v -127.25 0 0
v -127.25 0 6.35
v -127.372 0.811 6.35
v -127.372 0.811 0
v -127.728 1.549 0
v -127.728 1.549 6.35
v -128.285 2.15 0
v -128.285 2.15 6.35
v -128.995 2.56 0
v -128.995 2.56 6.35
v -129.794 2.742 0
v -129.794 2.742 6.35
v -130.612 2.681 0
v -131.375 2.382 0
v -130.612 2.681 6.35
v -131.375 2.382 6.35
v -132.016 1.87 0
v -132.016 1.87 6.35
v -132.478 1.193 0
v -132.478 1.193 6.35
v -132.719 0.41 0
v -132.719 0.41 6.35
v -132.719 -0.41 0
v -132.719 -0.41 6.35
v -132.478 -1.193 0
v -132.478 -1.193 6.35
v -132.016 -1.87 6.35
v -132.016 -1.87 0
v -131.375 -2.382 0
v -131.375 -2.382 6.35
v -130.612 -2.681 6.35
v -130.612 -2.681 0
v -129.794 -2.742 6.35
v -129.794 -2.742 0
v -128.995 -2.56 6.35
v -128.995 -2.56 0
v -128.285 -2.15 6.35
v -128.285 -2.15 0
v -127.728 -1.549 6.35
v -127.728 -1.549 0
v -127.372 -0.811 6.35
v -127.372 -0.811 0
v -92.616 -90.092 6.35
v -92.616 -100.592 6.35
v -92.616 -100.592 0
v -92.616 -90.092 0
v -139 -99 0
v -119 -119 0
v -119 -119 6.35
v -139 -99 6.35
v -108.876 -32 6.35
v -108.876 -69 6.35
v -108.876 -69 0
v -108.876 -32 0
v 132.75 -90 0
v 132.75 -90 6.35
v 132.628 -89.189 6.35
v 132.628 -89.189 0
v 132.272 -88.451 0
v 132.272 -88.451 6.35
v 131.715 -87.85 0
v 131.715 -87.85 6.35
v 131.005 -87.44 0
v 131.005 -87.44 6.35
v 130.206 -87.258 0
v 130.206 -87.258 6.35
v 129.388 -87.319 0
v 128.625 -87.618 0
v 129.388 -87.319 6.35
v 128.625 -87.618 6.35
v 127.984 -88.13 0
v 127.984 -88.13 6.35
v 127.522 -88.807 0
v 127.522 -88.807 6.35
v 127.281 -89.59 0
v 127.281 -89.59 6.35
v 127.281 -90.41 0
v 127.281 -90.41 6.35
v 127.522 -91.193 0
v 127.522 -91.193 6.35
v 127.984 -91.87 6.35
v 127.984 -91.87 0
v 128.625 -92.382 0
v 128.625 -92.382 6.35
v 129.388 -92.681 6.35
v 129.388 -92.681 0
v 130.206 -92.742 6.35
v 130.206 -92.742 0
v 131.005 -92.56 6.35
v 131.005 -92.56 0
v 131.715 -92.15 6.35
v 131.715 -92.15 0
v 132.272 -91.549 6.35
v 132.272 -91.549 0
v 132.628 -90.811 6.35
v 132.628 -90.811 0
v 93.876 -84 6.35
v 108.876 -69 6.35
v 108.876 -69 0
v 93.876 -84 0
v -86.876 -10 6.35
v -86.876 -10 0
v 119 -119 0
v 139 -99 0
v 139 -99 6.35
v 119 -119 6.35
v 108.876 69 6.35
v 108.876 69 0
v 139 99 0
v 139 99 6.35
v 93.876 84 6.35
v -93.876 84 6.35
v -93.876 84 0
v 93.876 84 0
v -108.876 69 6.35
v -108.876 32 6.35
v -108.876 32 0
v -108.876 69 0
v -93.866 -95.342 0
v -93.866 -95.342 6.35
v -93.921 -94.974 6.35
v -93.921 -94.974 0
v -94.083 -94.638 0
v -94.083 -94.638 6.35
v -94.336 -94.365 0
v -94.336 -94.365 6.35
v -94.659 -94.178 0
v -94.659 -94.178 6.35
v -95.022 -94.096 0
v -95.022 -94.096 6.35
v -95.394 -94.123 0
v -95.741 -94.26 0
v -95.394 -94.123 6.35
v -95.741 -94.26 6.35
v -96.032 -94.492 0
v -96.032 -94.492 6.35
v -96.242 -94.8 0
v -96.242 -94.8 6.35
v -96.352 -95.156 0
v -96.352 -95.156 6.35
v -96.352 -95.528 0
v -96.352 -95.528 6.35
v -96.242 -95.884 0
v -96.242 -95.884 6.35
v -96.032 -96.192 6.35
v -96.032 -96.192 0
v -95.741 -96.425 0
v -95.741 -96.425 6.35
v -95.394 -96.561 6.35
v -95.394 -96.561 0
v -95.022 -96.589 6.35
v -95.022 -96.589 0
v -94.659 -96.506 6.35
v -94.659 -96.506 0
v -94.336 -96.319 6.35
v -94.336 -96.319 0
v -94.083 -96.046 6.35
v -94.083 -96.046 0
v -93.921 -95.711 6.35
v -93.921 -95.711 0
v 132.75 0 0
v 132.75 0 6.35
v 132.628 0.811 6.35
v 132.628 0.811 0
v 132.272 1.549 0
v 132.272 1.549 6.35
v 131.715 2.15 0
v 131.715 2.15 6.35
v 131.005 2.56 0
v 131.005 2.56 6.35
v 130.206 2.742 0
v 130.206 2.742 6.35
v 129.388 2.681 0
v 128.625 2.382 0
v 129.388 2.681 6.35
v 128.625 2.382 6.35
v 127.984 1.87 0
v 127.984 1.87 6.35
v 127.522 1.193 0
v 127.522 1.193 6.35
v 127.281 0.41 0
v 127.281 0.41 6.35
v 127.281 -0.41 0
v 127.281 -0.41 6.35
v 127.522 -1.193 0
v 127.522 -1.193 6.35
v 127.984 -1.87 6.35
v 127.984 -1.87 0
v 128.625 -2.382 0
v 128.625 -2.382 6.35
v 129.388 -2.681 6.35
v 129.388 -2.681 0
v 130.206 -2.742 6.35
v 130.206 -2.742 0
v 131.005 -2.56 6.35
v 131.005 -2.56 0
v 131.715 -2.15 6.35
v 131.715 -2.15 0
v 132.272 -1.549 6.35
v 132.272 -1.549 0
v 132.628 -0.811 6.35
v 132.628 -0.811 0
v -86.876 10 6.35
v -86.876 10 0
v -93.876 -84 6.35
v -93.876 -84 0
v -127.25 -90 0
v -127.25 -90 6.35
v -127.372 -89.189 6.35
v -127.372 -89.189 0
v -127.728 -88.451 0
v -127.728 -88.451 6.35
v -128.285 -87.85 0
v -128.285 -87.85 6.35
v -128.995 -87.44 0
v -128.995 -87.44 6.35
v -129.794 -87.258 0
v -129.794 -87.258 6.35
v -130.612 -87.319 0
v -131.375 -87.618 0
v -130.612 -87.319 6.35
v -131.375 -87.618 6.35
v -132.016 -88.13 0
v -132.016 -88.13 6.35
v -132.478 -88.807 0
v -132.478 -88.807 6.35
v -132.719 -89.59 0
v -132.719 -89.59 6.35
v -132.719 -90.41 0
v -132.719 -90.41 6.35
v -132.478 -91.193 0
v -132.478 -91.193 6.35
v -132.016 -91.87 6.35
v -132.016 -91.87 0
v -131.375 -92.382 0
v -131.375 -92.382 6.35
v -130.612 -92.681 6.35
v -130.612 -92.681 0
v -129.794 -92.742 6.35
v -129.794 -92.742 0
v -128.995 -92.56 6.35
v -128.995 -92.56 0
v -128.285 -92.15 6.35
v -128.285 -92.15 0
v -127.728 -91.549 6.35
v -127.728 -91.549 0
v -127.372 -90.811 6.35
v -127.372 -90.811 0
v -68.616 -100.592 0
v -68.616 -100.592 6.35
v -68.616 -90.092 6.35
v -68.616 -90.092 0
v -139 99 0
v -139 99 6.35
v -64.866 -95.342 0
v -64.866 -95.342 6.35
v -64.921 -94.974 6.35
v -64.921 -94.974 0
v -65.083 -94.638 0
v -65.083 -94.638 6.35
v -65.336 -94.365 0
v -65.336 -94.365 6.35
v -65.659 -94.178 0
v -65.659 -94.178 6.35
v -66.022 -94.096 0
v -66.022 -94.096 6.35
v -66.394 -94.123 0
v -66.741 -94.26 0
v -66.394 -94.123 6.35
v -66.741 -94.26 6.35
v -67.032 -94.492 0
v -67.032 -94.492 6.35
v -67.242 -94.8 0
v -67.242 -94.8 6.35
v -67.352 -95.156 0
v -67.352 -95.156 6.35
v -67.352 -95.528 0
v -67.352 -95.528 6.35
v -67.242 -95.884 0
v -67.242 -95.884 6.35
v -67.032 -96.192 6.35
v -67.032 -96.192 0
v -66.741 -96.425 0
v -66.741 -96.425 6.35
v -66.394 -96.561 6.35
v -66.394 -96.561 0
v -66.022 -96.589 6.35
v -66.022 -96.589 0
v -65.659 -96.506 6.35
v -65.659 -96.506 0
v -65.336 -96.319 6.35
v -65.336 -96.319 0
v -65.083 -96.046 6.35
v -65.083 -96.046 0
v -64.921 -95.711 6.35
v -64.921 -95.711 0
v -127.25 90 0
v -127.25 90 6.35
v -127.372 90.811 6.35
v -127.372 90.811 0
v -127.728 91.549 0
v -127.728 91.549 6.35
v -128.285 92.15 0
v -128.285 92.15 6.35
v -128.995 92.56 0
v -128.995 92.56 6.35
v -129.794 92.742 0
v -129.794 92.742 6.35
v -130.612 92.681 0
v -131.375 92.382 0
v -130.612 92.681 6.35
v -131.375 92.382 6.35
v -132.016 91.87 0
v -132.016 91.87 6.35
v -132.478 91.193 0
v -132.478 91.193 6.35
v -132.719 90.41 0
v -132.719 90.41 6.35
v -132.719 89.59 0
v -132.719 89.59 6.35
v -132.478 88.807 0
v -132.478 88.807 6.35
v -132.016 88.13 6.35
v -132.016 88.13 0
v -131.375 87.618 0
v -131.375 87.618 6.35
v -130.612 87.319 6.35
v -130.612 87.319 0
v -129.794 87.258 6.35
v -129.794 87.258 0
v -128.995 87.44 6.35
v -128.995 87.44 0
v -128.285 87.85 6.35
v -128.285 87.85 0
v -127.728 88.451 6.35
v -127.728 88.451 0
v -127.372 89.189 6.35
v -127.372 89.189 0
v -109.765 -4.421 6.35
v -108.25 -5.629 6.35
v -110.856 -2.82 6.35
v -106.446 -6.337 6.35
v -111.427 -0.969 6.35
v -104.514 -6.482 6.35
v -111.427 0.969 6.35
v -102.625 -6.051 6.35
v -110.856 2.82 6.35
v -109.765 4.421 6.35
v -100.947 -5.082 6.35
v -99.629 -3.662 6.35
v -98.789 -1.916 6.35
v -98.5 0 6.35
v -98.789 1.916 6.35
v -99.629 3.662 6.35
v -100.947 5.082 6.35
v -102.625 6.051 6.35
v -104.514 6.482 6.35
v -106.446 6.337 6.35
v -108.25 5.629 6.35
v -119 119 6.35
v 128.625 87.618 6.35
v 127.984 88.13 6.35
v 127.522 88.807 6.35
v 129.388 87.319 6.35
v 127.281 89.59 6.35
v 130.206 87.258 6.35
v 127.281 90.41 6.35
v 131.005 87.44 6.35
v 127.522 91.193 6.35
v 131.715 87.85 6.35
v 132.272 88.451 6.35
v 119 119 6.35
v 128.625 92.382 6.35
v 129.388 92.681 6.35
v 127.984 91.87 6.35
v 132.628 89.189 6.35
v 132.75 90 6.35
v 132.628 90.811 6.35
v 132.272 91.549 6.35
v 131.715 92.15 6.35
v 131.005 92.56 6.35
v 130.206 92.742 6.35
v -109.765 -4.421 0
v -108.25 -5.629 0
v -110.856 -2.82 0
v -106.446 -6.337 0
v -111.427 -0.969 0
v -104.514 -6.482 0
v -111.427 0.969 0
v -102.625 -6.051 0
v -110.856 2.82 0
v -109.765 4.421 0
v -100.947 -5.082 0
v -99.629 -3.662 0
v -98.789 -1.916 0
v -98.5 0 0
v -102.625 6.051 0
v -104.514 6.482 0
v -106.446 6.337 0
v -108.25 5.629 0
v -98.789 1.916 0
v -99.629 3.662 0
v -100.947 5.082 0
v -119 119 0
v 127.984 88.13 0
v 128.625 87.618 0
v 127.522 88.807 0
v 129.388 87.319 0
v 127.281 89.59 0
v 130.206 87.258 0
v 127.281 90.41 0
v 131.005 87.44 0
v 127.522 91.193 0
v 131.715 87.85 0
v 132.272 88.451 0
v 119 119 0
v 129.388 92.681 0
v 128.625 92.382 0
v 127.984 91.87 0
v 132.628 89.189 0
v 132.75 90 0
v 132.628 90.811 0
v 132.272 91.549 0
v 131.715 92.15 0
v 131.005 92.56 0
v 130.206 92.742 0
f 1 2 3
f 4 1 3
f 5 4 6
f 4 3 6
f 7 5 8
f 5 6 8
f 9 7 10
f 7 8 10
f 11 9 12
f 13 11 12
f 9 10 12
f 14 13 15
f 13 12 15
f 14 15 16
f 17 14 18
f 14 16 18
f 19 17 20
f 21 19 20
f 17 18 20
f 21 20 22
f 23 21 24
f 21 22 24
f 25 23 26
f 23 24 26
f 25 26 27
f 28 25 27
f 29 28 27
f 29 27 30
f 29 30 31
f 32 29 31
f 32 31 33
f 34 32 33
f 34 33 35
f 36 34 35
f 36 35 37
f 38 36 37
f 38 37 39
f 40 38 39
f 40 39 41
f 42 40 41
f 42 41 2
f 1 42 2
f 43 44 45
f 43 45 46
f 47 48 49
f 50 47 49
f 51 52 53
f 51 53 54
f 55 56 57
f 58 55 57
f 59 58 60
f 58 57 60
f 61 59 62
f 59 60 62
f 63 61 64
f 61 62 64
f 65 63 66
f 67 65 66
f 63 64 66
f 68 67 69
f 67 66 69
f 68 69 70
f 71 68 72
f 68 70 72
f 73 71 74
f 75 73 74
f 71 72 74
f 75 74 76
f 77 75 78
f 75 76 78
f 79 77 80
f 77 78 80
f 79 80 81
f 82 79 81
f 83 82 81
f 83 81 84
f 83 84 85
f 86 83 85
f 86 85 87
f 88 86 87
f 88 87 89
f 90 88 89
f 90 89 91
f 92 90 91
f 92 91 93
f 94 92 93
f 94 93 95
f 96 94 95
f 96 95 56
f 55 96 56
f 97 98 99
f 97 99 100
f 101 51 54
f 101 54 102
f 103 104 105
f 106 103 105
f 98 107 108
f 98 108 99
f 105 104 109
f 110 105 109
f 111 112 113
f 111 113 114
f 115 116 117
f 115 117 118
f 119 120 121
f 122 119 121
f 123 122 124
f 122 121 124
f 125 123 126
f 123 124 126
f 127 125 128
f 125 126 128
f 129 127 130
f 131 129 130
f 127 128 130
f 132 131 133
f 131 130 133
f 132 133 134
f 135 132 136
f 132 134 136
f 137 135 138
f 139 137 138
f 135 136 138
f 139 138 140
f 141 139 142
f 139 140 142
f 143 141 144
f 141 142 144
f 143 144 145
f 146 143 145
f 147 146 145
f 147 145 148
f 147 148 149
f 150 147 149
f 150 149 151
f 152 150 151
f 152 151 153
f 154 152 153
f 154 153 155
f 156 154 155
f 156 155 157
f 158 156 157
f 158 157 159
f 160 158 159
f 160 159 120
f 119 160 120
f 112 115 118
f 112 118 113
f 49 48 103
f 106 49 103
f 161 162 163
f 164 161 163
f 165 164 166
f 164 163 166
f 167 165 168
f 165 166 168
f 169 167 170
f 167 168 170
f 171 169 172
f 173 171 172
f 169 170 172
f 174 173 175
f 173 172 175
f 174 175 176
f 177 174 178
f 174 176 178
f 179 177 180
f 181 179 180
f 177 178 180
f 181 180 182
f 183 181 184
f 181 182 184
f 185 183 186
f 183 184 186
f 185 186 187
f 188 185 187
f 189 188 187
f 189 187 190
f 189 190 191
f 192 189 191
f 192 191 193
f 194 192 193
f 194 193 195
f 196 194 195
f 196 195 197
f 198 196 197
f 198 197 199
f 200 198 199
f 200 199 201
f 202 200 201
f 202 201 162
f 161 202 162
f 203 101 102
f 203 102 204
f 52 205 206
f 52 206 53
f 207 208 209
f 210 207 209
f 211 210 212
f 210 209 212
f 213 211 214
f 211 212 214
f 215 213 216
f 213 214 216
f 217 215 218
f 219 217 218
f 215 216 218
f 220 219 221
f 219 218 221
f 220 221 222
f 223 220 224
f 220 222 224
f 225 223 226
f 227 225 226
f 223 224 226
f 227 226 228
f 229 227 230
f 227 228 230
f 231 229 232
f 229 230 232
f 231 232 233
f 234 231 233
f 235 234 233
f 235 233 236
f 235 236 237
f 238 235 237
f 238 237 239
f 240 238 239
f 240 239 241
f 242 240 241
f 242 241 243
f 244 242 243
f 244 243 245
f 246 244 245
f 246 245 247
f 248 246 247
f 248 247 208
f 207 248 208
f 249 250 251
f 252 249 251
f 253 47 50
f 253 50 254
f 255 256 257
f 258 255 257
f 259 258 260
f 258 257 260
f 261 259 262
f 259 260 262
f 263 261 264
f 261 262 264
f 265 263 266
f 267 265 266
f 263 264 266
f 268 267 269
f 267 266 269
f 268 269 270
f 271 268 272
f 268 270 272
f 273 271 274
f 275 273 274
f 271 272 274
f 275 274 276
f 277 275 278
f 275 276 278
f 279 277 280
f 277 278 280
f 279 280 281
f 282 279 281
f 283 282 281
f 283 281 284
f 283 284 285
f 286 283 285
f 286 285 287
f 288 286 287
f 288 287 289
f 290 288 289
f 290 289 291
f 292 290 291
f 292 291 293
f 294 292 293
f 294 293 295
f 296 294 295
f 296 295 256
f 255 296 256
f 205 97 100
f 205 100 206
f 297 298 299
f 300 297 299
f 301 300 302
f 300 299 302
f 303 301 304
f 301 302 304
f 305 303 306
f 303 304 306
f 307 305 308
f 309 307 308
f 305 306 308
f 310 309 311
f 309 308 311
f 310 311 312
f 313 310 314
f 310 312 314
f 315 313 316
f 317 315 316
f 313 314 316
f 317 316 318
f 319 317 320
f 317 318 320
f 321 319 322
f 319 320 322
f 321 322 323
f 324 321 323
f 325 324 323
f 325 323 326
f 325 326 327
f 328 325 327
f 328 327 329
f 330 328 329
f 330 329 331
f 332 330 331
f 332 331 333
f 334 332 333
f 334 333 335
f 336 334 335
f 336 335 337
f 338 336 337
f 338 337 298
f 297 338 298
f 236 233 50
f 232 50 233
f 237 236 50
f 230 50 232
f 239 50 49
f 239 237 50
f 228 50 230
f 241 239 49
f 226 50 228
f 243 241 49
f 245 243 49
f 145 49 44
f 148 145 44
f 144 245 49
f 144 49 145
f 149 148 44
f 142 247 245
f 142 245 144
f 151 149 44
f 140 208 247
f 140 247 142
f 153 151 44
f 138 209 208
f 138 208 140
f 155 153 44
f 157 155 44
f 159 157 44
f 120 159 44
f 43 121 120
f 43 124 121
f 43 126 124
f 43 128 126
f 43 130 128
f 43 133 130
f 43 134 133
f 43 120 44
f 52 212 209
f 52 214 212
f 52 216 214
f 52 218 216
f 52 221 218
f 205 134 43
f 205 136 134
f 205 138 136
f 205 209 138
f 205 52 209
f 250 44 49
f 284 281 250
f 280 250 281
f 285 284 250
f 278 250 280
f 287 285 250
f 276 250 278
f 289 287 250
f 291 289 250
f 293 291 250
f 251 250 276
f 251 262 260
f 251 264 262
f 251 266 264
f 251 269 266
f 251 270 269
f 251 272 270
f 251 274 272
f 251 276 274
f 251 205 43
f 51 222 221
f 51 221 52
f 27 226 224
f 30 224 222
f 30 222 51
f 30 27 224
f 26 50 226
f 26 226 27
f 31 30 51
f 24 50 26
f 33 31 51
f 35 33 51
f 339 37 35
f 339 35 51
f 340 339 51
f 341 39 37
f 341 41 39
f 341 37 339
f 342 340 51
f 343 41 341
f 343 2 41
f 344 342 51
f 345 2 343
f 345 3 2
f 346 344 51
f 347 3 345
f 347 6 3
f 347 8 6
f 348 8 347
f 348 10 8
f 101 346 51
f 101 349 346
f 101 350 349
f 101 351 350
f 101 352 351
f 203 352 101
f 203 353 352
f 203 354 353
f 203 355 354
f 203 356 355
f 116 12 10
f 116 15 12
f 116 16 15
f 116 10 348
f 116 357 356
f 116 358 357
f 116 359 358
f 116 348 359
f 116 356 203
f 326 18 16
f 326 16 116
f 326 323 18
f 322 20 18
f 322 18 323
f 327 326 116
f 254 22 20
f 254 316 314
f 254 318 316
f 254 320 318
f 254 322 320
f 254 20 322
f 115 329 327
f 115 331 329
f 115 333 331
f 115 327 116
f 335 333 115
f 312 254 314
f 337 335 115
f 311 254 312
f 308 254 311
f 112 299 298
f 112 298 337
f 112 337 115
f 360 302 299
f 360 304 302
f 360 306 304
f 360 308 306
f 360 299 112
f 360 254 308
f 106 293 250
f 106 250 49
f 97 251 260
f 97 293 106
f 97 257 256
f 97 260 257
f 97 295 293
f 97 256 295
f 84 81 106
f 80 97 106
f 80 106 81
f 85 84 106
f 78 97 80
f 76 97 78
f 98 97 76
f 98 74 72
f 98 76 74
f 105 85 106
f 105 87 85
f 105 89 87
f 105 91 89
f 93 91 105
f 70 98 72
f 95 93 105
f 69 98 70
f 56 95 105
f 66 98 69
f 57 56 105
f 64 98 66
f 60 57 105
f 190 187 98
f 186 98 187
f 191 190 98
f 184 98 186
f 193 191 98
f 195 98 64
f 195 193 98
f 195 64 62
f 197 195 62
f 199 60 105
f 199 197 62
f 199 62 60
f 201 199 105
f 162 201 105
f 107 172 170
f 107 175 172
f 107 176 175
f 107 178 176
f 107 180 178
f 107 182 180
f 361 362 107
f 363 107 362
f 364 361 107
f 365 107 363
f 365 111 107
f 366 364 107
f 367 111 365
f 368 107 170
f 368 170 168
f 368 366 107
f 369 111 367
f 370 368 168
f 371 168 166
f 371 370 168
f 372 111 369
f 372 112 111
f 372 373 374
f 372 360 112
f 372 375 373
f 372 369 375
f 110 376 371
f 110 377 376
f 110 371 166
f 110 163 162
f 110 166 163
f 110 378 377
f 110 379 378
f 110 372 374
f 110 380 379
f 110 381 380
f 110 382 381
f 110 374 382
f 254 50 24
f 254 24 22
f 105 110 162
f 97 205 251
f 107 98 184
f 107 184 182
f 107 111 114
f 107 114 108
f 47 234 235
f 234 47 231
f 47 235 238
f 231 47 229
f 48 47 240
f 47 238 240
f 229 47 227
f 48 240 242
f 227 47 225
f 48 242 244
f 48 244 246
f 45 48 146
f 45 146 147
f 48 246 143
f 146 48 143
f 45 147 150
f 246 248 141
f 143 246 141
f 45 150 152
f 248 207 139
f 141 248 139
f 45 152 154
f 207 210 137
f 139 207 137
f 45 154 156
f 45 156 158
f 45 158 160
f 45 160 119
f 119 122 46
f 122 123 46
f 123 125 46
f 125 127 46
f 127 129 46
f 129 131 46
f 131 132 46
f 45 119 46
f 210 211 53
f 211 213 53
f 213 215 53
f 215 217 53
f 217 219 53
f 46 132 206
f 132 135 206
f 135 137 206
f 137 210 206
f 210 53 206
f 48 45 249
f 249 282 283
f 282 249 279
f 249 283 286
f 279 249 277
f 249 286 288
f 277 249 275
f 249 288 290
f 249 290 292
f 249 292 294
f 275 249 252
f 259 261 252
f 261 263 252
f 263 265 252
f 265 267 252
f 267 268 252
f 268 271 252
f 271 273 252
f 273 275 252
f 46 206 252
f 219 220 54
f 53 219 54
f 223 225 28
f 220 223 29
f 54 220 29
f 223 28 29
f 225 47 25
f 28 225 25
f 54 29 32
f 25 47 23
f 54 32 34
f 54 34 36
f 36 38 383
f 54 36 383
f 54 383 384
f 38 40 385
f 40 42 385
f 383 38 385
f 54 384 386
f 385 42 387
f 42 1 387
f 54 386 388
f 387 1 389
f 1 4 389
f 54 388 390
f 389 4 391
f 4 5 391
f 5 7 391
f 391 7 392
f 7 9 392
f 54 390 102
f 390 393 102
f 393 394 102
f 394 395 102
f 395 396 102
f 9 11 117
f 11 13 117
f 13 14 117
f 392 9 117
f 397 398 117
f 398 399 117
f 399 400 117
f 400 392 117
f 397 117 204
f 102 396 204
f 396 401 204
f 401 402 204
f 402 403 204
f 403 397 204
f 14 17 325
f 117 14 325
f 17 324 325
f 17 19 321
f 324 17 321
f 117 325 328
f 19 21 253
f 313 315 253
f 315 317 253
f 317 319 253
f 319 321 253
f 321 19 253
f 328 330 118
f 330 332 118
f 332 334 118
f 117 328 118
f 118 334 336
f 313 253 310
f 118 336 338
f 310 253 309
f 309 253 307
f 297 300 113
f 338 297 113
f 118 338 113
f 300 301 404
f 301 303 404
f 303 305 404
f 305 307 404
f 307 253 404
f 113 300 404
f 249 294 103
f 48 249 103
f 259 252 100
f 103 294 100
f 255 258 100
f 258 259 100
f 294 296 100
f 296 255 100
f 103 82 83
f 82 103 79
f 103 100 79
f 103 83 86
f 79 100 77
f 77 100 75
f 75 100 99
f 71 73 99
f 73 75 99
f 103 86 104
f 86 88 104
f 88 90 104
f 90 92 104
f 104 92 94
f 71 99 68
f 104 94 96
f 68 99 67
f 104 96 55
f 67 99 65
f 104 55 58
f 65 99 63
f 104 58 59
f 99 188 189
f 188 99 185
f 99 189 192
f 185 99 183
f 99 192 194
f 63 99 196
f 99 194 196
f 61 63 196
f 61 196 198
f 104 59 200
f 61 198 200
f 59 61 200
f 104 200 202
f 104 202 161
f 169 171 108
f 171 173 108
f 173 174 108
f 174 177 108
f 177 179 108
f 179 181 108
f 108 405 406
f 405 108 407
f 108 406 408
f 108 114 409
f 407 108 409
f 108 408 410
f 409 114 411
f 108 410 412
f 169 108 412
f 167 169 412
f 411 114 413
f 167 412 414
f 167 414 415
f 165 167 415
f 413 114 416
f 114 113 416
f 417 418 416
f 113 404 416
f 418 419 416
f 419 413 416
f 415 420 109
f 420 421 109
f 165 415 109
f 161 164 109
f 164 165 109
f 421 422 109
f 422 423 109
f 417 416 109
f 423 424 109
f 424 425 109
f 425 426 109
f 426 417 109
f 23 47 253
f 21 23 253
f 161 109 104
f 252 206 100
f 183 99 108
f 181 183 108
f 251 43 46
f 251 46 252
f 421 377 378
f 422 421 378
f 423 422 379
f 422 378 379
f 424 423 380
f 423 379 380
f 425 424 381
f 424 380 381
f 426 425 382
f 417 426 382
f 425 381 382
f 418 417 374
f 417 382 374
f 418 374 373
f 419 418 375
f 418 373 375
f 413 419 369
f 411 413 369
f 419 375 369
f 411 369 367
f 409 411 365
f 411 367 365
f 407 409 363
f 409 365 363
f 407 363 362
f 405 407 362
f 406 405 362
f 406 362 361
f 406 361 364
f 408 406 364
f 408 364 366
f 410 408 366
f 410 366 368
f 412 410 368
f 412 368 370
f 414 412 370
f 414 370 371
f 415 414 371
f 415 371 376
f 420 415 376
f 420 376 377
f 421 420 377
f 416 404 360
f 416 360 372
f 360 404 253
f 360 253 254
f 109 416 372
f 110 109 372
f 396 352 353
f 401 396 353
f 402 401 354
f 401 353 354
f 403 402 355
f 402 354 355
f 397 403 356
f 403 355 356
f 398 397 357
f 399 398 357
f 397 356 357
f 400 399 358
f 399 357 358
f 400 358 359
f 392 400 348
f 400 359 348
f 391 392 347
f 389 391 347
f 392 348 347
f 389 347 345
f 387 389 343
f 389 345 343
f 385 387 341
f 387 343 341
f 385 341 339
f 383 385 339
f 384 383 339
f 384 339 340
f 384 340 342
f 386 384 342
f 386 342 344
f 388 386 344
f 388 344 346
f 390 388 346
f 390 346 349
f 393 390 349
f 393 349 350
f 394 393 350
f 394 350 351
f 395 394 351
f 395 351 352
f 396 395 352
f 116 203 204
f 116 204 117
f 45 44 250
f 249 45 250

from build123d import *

# Parameters (mm, degrees)
SKETCH1_W           = 278
SKETCH1_H           = 238
BOSS_EXTRUDE1_DEPTH = 6.35
CHAMFER1_SIZE       = 20
SKETCH4_R           = 2.75
CUT_EXTRUDE2_DEPTH  = 76.2
SKETCH5_R           = 6.5
CUT_EXTRUDE3_DEPTH  = 10
SKETCH7_R           = 1.25
SKETCH7_W           = 24
SKETCH7_H           = 10.5
CUT_EXTRUDE4_DEPTH  = 7.35


with BuildPart() as part:
    # Sketch1 → Boss-Extrude1 (new body)
    with BuildSketch(Plane.XY):
        Rectangle(SKETCH1_W, SKETCH1_H)
    extrude(amount=BOSS_EXTRUDE1_DEPTH)

    # Chamfer1
    chamfer1_edges = [part.edges().sort_by_distance(p)[0] for p in [
        (-139, 119, 3.175),
        (139, 119, 3.175),
        (139, -119, 3.175),
        (-139, -119, 3.175),
    ]]
    chamfer(chamfer1_edges, length=CHAMFER1_SIZE)

    # Sketch4 → Cut-Extrude2 (cut)
    with BuildSketch(Plane.XY.offset(6.35)):
        with Locations((-130, 90)):
            Circle(SKETCH4_R)
        with Locations((-130, -90)):
            Circle(SKETCH4_R)
        with Locations((-130, 0)):
            Circle(SKETCH4_R)
        with Locations((130, -90)):
            Circle(SKETCH4_R)
        with Locations((130, 0)):
            Circle(SKETCH4_R)
        with Locations((130, 90)):
            Circle(SKETCH4_R)
    extrude(amount=-CUT_EXTRUDE2_DEPTH, mode=Mode.SUBTRACT)

    # Sketch5 → Cut-Extrude3 (cut)
    with BuildSketch(Plane.XY.offset(6.35)):
        with Locations((-105, 0)):
            Circle(SKETCH5_R)
        Polygon((93.875716073, -84), (-93.875716073, -84), (-108.875716073, -69), (-108.875716073, -32), (-86.875716073, -10), (-86.875716073, 10), (-108.875716073, 32), (-108.875716073, 69), (-93.875716073, 84), (93.875716073, 84), (108.875716073, 69), (108.875716073, -69), align=None)
    extrude(amount=-CUT_EXTRUDE3_DEPTH, mode=Mode.SUBTRACT)

    # Sketch7 → Cut-Extrude4 (cut, through all)
    with BuildSketch(Plane.XY.offset(6.35)):
        with Locations((-66.115841415, -95.342057099)):
            Circle(SKETCH7_R)
        with Locations((-95.115841415, -95.342057099)):
            Circle(SKETCH7_R)
        with Locations((-80.615841415, -95.342057099)):
            Rectangle(SKETCH7_W, SKETCH7_H)
    extrude(amount=-CUT_EXTRUDE4_DEPTH, mode=Mode.SUBTRACT)


solid = part.part
